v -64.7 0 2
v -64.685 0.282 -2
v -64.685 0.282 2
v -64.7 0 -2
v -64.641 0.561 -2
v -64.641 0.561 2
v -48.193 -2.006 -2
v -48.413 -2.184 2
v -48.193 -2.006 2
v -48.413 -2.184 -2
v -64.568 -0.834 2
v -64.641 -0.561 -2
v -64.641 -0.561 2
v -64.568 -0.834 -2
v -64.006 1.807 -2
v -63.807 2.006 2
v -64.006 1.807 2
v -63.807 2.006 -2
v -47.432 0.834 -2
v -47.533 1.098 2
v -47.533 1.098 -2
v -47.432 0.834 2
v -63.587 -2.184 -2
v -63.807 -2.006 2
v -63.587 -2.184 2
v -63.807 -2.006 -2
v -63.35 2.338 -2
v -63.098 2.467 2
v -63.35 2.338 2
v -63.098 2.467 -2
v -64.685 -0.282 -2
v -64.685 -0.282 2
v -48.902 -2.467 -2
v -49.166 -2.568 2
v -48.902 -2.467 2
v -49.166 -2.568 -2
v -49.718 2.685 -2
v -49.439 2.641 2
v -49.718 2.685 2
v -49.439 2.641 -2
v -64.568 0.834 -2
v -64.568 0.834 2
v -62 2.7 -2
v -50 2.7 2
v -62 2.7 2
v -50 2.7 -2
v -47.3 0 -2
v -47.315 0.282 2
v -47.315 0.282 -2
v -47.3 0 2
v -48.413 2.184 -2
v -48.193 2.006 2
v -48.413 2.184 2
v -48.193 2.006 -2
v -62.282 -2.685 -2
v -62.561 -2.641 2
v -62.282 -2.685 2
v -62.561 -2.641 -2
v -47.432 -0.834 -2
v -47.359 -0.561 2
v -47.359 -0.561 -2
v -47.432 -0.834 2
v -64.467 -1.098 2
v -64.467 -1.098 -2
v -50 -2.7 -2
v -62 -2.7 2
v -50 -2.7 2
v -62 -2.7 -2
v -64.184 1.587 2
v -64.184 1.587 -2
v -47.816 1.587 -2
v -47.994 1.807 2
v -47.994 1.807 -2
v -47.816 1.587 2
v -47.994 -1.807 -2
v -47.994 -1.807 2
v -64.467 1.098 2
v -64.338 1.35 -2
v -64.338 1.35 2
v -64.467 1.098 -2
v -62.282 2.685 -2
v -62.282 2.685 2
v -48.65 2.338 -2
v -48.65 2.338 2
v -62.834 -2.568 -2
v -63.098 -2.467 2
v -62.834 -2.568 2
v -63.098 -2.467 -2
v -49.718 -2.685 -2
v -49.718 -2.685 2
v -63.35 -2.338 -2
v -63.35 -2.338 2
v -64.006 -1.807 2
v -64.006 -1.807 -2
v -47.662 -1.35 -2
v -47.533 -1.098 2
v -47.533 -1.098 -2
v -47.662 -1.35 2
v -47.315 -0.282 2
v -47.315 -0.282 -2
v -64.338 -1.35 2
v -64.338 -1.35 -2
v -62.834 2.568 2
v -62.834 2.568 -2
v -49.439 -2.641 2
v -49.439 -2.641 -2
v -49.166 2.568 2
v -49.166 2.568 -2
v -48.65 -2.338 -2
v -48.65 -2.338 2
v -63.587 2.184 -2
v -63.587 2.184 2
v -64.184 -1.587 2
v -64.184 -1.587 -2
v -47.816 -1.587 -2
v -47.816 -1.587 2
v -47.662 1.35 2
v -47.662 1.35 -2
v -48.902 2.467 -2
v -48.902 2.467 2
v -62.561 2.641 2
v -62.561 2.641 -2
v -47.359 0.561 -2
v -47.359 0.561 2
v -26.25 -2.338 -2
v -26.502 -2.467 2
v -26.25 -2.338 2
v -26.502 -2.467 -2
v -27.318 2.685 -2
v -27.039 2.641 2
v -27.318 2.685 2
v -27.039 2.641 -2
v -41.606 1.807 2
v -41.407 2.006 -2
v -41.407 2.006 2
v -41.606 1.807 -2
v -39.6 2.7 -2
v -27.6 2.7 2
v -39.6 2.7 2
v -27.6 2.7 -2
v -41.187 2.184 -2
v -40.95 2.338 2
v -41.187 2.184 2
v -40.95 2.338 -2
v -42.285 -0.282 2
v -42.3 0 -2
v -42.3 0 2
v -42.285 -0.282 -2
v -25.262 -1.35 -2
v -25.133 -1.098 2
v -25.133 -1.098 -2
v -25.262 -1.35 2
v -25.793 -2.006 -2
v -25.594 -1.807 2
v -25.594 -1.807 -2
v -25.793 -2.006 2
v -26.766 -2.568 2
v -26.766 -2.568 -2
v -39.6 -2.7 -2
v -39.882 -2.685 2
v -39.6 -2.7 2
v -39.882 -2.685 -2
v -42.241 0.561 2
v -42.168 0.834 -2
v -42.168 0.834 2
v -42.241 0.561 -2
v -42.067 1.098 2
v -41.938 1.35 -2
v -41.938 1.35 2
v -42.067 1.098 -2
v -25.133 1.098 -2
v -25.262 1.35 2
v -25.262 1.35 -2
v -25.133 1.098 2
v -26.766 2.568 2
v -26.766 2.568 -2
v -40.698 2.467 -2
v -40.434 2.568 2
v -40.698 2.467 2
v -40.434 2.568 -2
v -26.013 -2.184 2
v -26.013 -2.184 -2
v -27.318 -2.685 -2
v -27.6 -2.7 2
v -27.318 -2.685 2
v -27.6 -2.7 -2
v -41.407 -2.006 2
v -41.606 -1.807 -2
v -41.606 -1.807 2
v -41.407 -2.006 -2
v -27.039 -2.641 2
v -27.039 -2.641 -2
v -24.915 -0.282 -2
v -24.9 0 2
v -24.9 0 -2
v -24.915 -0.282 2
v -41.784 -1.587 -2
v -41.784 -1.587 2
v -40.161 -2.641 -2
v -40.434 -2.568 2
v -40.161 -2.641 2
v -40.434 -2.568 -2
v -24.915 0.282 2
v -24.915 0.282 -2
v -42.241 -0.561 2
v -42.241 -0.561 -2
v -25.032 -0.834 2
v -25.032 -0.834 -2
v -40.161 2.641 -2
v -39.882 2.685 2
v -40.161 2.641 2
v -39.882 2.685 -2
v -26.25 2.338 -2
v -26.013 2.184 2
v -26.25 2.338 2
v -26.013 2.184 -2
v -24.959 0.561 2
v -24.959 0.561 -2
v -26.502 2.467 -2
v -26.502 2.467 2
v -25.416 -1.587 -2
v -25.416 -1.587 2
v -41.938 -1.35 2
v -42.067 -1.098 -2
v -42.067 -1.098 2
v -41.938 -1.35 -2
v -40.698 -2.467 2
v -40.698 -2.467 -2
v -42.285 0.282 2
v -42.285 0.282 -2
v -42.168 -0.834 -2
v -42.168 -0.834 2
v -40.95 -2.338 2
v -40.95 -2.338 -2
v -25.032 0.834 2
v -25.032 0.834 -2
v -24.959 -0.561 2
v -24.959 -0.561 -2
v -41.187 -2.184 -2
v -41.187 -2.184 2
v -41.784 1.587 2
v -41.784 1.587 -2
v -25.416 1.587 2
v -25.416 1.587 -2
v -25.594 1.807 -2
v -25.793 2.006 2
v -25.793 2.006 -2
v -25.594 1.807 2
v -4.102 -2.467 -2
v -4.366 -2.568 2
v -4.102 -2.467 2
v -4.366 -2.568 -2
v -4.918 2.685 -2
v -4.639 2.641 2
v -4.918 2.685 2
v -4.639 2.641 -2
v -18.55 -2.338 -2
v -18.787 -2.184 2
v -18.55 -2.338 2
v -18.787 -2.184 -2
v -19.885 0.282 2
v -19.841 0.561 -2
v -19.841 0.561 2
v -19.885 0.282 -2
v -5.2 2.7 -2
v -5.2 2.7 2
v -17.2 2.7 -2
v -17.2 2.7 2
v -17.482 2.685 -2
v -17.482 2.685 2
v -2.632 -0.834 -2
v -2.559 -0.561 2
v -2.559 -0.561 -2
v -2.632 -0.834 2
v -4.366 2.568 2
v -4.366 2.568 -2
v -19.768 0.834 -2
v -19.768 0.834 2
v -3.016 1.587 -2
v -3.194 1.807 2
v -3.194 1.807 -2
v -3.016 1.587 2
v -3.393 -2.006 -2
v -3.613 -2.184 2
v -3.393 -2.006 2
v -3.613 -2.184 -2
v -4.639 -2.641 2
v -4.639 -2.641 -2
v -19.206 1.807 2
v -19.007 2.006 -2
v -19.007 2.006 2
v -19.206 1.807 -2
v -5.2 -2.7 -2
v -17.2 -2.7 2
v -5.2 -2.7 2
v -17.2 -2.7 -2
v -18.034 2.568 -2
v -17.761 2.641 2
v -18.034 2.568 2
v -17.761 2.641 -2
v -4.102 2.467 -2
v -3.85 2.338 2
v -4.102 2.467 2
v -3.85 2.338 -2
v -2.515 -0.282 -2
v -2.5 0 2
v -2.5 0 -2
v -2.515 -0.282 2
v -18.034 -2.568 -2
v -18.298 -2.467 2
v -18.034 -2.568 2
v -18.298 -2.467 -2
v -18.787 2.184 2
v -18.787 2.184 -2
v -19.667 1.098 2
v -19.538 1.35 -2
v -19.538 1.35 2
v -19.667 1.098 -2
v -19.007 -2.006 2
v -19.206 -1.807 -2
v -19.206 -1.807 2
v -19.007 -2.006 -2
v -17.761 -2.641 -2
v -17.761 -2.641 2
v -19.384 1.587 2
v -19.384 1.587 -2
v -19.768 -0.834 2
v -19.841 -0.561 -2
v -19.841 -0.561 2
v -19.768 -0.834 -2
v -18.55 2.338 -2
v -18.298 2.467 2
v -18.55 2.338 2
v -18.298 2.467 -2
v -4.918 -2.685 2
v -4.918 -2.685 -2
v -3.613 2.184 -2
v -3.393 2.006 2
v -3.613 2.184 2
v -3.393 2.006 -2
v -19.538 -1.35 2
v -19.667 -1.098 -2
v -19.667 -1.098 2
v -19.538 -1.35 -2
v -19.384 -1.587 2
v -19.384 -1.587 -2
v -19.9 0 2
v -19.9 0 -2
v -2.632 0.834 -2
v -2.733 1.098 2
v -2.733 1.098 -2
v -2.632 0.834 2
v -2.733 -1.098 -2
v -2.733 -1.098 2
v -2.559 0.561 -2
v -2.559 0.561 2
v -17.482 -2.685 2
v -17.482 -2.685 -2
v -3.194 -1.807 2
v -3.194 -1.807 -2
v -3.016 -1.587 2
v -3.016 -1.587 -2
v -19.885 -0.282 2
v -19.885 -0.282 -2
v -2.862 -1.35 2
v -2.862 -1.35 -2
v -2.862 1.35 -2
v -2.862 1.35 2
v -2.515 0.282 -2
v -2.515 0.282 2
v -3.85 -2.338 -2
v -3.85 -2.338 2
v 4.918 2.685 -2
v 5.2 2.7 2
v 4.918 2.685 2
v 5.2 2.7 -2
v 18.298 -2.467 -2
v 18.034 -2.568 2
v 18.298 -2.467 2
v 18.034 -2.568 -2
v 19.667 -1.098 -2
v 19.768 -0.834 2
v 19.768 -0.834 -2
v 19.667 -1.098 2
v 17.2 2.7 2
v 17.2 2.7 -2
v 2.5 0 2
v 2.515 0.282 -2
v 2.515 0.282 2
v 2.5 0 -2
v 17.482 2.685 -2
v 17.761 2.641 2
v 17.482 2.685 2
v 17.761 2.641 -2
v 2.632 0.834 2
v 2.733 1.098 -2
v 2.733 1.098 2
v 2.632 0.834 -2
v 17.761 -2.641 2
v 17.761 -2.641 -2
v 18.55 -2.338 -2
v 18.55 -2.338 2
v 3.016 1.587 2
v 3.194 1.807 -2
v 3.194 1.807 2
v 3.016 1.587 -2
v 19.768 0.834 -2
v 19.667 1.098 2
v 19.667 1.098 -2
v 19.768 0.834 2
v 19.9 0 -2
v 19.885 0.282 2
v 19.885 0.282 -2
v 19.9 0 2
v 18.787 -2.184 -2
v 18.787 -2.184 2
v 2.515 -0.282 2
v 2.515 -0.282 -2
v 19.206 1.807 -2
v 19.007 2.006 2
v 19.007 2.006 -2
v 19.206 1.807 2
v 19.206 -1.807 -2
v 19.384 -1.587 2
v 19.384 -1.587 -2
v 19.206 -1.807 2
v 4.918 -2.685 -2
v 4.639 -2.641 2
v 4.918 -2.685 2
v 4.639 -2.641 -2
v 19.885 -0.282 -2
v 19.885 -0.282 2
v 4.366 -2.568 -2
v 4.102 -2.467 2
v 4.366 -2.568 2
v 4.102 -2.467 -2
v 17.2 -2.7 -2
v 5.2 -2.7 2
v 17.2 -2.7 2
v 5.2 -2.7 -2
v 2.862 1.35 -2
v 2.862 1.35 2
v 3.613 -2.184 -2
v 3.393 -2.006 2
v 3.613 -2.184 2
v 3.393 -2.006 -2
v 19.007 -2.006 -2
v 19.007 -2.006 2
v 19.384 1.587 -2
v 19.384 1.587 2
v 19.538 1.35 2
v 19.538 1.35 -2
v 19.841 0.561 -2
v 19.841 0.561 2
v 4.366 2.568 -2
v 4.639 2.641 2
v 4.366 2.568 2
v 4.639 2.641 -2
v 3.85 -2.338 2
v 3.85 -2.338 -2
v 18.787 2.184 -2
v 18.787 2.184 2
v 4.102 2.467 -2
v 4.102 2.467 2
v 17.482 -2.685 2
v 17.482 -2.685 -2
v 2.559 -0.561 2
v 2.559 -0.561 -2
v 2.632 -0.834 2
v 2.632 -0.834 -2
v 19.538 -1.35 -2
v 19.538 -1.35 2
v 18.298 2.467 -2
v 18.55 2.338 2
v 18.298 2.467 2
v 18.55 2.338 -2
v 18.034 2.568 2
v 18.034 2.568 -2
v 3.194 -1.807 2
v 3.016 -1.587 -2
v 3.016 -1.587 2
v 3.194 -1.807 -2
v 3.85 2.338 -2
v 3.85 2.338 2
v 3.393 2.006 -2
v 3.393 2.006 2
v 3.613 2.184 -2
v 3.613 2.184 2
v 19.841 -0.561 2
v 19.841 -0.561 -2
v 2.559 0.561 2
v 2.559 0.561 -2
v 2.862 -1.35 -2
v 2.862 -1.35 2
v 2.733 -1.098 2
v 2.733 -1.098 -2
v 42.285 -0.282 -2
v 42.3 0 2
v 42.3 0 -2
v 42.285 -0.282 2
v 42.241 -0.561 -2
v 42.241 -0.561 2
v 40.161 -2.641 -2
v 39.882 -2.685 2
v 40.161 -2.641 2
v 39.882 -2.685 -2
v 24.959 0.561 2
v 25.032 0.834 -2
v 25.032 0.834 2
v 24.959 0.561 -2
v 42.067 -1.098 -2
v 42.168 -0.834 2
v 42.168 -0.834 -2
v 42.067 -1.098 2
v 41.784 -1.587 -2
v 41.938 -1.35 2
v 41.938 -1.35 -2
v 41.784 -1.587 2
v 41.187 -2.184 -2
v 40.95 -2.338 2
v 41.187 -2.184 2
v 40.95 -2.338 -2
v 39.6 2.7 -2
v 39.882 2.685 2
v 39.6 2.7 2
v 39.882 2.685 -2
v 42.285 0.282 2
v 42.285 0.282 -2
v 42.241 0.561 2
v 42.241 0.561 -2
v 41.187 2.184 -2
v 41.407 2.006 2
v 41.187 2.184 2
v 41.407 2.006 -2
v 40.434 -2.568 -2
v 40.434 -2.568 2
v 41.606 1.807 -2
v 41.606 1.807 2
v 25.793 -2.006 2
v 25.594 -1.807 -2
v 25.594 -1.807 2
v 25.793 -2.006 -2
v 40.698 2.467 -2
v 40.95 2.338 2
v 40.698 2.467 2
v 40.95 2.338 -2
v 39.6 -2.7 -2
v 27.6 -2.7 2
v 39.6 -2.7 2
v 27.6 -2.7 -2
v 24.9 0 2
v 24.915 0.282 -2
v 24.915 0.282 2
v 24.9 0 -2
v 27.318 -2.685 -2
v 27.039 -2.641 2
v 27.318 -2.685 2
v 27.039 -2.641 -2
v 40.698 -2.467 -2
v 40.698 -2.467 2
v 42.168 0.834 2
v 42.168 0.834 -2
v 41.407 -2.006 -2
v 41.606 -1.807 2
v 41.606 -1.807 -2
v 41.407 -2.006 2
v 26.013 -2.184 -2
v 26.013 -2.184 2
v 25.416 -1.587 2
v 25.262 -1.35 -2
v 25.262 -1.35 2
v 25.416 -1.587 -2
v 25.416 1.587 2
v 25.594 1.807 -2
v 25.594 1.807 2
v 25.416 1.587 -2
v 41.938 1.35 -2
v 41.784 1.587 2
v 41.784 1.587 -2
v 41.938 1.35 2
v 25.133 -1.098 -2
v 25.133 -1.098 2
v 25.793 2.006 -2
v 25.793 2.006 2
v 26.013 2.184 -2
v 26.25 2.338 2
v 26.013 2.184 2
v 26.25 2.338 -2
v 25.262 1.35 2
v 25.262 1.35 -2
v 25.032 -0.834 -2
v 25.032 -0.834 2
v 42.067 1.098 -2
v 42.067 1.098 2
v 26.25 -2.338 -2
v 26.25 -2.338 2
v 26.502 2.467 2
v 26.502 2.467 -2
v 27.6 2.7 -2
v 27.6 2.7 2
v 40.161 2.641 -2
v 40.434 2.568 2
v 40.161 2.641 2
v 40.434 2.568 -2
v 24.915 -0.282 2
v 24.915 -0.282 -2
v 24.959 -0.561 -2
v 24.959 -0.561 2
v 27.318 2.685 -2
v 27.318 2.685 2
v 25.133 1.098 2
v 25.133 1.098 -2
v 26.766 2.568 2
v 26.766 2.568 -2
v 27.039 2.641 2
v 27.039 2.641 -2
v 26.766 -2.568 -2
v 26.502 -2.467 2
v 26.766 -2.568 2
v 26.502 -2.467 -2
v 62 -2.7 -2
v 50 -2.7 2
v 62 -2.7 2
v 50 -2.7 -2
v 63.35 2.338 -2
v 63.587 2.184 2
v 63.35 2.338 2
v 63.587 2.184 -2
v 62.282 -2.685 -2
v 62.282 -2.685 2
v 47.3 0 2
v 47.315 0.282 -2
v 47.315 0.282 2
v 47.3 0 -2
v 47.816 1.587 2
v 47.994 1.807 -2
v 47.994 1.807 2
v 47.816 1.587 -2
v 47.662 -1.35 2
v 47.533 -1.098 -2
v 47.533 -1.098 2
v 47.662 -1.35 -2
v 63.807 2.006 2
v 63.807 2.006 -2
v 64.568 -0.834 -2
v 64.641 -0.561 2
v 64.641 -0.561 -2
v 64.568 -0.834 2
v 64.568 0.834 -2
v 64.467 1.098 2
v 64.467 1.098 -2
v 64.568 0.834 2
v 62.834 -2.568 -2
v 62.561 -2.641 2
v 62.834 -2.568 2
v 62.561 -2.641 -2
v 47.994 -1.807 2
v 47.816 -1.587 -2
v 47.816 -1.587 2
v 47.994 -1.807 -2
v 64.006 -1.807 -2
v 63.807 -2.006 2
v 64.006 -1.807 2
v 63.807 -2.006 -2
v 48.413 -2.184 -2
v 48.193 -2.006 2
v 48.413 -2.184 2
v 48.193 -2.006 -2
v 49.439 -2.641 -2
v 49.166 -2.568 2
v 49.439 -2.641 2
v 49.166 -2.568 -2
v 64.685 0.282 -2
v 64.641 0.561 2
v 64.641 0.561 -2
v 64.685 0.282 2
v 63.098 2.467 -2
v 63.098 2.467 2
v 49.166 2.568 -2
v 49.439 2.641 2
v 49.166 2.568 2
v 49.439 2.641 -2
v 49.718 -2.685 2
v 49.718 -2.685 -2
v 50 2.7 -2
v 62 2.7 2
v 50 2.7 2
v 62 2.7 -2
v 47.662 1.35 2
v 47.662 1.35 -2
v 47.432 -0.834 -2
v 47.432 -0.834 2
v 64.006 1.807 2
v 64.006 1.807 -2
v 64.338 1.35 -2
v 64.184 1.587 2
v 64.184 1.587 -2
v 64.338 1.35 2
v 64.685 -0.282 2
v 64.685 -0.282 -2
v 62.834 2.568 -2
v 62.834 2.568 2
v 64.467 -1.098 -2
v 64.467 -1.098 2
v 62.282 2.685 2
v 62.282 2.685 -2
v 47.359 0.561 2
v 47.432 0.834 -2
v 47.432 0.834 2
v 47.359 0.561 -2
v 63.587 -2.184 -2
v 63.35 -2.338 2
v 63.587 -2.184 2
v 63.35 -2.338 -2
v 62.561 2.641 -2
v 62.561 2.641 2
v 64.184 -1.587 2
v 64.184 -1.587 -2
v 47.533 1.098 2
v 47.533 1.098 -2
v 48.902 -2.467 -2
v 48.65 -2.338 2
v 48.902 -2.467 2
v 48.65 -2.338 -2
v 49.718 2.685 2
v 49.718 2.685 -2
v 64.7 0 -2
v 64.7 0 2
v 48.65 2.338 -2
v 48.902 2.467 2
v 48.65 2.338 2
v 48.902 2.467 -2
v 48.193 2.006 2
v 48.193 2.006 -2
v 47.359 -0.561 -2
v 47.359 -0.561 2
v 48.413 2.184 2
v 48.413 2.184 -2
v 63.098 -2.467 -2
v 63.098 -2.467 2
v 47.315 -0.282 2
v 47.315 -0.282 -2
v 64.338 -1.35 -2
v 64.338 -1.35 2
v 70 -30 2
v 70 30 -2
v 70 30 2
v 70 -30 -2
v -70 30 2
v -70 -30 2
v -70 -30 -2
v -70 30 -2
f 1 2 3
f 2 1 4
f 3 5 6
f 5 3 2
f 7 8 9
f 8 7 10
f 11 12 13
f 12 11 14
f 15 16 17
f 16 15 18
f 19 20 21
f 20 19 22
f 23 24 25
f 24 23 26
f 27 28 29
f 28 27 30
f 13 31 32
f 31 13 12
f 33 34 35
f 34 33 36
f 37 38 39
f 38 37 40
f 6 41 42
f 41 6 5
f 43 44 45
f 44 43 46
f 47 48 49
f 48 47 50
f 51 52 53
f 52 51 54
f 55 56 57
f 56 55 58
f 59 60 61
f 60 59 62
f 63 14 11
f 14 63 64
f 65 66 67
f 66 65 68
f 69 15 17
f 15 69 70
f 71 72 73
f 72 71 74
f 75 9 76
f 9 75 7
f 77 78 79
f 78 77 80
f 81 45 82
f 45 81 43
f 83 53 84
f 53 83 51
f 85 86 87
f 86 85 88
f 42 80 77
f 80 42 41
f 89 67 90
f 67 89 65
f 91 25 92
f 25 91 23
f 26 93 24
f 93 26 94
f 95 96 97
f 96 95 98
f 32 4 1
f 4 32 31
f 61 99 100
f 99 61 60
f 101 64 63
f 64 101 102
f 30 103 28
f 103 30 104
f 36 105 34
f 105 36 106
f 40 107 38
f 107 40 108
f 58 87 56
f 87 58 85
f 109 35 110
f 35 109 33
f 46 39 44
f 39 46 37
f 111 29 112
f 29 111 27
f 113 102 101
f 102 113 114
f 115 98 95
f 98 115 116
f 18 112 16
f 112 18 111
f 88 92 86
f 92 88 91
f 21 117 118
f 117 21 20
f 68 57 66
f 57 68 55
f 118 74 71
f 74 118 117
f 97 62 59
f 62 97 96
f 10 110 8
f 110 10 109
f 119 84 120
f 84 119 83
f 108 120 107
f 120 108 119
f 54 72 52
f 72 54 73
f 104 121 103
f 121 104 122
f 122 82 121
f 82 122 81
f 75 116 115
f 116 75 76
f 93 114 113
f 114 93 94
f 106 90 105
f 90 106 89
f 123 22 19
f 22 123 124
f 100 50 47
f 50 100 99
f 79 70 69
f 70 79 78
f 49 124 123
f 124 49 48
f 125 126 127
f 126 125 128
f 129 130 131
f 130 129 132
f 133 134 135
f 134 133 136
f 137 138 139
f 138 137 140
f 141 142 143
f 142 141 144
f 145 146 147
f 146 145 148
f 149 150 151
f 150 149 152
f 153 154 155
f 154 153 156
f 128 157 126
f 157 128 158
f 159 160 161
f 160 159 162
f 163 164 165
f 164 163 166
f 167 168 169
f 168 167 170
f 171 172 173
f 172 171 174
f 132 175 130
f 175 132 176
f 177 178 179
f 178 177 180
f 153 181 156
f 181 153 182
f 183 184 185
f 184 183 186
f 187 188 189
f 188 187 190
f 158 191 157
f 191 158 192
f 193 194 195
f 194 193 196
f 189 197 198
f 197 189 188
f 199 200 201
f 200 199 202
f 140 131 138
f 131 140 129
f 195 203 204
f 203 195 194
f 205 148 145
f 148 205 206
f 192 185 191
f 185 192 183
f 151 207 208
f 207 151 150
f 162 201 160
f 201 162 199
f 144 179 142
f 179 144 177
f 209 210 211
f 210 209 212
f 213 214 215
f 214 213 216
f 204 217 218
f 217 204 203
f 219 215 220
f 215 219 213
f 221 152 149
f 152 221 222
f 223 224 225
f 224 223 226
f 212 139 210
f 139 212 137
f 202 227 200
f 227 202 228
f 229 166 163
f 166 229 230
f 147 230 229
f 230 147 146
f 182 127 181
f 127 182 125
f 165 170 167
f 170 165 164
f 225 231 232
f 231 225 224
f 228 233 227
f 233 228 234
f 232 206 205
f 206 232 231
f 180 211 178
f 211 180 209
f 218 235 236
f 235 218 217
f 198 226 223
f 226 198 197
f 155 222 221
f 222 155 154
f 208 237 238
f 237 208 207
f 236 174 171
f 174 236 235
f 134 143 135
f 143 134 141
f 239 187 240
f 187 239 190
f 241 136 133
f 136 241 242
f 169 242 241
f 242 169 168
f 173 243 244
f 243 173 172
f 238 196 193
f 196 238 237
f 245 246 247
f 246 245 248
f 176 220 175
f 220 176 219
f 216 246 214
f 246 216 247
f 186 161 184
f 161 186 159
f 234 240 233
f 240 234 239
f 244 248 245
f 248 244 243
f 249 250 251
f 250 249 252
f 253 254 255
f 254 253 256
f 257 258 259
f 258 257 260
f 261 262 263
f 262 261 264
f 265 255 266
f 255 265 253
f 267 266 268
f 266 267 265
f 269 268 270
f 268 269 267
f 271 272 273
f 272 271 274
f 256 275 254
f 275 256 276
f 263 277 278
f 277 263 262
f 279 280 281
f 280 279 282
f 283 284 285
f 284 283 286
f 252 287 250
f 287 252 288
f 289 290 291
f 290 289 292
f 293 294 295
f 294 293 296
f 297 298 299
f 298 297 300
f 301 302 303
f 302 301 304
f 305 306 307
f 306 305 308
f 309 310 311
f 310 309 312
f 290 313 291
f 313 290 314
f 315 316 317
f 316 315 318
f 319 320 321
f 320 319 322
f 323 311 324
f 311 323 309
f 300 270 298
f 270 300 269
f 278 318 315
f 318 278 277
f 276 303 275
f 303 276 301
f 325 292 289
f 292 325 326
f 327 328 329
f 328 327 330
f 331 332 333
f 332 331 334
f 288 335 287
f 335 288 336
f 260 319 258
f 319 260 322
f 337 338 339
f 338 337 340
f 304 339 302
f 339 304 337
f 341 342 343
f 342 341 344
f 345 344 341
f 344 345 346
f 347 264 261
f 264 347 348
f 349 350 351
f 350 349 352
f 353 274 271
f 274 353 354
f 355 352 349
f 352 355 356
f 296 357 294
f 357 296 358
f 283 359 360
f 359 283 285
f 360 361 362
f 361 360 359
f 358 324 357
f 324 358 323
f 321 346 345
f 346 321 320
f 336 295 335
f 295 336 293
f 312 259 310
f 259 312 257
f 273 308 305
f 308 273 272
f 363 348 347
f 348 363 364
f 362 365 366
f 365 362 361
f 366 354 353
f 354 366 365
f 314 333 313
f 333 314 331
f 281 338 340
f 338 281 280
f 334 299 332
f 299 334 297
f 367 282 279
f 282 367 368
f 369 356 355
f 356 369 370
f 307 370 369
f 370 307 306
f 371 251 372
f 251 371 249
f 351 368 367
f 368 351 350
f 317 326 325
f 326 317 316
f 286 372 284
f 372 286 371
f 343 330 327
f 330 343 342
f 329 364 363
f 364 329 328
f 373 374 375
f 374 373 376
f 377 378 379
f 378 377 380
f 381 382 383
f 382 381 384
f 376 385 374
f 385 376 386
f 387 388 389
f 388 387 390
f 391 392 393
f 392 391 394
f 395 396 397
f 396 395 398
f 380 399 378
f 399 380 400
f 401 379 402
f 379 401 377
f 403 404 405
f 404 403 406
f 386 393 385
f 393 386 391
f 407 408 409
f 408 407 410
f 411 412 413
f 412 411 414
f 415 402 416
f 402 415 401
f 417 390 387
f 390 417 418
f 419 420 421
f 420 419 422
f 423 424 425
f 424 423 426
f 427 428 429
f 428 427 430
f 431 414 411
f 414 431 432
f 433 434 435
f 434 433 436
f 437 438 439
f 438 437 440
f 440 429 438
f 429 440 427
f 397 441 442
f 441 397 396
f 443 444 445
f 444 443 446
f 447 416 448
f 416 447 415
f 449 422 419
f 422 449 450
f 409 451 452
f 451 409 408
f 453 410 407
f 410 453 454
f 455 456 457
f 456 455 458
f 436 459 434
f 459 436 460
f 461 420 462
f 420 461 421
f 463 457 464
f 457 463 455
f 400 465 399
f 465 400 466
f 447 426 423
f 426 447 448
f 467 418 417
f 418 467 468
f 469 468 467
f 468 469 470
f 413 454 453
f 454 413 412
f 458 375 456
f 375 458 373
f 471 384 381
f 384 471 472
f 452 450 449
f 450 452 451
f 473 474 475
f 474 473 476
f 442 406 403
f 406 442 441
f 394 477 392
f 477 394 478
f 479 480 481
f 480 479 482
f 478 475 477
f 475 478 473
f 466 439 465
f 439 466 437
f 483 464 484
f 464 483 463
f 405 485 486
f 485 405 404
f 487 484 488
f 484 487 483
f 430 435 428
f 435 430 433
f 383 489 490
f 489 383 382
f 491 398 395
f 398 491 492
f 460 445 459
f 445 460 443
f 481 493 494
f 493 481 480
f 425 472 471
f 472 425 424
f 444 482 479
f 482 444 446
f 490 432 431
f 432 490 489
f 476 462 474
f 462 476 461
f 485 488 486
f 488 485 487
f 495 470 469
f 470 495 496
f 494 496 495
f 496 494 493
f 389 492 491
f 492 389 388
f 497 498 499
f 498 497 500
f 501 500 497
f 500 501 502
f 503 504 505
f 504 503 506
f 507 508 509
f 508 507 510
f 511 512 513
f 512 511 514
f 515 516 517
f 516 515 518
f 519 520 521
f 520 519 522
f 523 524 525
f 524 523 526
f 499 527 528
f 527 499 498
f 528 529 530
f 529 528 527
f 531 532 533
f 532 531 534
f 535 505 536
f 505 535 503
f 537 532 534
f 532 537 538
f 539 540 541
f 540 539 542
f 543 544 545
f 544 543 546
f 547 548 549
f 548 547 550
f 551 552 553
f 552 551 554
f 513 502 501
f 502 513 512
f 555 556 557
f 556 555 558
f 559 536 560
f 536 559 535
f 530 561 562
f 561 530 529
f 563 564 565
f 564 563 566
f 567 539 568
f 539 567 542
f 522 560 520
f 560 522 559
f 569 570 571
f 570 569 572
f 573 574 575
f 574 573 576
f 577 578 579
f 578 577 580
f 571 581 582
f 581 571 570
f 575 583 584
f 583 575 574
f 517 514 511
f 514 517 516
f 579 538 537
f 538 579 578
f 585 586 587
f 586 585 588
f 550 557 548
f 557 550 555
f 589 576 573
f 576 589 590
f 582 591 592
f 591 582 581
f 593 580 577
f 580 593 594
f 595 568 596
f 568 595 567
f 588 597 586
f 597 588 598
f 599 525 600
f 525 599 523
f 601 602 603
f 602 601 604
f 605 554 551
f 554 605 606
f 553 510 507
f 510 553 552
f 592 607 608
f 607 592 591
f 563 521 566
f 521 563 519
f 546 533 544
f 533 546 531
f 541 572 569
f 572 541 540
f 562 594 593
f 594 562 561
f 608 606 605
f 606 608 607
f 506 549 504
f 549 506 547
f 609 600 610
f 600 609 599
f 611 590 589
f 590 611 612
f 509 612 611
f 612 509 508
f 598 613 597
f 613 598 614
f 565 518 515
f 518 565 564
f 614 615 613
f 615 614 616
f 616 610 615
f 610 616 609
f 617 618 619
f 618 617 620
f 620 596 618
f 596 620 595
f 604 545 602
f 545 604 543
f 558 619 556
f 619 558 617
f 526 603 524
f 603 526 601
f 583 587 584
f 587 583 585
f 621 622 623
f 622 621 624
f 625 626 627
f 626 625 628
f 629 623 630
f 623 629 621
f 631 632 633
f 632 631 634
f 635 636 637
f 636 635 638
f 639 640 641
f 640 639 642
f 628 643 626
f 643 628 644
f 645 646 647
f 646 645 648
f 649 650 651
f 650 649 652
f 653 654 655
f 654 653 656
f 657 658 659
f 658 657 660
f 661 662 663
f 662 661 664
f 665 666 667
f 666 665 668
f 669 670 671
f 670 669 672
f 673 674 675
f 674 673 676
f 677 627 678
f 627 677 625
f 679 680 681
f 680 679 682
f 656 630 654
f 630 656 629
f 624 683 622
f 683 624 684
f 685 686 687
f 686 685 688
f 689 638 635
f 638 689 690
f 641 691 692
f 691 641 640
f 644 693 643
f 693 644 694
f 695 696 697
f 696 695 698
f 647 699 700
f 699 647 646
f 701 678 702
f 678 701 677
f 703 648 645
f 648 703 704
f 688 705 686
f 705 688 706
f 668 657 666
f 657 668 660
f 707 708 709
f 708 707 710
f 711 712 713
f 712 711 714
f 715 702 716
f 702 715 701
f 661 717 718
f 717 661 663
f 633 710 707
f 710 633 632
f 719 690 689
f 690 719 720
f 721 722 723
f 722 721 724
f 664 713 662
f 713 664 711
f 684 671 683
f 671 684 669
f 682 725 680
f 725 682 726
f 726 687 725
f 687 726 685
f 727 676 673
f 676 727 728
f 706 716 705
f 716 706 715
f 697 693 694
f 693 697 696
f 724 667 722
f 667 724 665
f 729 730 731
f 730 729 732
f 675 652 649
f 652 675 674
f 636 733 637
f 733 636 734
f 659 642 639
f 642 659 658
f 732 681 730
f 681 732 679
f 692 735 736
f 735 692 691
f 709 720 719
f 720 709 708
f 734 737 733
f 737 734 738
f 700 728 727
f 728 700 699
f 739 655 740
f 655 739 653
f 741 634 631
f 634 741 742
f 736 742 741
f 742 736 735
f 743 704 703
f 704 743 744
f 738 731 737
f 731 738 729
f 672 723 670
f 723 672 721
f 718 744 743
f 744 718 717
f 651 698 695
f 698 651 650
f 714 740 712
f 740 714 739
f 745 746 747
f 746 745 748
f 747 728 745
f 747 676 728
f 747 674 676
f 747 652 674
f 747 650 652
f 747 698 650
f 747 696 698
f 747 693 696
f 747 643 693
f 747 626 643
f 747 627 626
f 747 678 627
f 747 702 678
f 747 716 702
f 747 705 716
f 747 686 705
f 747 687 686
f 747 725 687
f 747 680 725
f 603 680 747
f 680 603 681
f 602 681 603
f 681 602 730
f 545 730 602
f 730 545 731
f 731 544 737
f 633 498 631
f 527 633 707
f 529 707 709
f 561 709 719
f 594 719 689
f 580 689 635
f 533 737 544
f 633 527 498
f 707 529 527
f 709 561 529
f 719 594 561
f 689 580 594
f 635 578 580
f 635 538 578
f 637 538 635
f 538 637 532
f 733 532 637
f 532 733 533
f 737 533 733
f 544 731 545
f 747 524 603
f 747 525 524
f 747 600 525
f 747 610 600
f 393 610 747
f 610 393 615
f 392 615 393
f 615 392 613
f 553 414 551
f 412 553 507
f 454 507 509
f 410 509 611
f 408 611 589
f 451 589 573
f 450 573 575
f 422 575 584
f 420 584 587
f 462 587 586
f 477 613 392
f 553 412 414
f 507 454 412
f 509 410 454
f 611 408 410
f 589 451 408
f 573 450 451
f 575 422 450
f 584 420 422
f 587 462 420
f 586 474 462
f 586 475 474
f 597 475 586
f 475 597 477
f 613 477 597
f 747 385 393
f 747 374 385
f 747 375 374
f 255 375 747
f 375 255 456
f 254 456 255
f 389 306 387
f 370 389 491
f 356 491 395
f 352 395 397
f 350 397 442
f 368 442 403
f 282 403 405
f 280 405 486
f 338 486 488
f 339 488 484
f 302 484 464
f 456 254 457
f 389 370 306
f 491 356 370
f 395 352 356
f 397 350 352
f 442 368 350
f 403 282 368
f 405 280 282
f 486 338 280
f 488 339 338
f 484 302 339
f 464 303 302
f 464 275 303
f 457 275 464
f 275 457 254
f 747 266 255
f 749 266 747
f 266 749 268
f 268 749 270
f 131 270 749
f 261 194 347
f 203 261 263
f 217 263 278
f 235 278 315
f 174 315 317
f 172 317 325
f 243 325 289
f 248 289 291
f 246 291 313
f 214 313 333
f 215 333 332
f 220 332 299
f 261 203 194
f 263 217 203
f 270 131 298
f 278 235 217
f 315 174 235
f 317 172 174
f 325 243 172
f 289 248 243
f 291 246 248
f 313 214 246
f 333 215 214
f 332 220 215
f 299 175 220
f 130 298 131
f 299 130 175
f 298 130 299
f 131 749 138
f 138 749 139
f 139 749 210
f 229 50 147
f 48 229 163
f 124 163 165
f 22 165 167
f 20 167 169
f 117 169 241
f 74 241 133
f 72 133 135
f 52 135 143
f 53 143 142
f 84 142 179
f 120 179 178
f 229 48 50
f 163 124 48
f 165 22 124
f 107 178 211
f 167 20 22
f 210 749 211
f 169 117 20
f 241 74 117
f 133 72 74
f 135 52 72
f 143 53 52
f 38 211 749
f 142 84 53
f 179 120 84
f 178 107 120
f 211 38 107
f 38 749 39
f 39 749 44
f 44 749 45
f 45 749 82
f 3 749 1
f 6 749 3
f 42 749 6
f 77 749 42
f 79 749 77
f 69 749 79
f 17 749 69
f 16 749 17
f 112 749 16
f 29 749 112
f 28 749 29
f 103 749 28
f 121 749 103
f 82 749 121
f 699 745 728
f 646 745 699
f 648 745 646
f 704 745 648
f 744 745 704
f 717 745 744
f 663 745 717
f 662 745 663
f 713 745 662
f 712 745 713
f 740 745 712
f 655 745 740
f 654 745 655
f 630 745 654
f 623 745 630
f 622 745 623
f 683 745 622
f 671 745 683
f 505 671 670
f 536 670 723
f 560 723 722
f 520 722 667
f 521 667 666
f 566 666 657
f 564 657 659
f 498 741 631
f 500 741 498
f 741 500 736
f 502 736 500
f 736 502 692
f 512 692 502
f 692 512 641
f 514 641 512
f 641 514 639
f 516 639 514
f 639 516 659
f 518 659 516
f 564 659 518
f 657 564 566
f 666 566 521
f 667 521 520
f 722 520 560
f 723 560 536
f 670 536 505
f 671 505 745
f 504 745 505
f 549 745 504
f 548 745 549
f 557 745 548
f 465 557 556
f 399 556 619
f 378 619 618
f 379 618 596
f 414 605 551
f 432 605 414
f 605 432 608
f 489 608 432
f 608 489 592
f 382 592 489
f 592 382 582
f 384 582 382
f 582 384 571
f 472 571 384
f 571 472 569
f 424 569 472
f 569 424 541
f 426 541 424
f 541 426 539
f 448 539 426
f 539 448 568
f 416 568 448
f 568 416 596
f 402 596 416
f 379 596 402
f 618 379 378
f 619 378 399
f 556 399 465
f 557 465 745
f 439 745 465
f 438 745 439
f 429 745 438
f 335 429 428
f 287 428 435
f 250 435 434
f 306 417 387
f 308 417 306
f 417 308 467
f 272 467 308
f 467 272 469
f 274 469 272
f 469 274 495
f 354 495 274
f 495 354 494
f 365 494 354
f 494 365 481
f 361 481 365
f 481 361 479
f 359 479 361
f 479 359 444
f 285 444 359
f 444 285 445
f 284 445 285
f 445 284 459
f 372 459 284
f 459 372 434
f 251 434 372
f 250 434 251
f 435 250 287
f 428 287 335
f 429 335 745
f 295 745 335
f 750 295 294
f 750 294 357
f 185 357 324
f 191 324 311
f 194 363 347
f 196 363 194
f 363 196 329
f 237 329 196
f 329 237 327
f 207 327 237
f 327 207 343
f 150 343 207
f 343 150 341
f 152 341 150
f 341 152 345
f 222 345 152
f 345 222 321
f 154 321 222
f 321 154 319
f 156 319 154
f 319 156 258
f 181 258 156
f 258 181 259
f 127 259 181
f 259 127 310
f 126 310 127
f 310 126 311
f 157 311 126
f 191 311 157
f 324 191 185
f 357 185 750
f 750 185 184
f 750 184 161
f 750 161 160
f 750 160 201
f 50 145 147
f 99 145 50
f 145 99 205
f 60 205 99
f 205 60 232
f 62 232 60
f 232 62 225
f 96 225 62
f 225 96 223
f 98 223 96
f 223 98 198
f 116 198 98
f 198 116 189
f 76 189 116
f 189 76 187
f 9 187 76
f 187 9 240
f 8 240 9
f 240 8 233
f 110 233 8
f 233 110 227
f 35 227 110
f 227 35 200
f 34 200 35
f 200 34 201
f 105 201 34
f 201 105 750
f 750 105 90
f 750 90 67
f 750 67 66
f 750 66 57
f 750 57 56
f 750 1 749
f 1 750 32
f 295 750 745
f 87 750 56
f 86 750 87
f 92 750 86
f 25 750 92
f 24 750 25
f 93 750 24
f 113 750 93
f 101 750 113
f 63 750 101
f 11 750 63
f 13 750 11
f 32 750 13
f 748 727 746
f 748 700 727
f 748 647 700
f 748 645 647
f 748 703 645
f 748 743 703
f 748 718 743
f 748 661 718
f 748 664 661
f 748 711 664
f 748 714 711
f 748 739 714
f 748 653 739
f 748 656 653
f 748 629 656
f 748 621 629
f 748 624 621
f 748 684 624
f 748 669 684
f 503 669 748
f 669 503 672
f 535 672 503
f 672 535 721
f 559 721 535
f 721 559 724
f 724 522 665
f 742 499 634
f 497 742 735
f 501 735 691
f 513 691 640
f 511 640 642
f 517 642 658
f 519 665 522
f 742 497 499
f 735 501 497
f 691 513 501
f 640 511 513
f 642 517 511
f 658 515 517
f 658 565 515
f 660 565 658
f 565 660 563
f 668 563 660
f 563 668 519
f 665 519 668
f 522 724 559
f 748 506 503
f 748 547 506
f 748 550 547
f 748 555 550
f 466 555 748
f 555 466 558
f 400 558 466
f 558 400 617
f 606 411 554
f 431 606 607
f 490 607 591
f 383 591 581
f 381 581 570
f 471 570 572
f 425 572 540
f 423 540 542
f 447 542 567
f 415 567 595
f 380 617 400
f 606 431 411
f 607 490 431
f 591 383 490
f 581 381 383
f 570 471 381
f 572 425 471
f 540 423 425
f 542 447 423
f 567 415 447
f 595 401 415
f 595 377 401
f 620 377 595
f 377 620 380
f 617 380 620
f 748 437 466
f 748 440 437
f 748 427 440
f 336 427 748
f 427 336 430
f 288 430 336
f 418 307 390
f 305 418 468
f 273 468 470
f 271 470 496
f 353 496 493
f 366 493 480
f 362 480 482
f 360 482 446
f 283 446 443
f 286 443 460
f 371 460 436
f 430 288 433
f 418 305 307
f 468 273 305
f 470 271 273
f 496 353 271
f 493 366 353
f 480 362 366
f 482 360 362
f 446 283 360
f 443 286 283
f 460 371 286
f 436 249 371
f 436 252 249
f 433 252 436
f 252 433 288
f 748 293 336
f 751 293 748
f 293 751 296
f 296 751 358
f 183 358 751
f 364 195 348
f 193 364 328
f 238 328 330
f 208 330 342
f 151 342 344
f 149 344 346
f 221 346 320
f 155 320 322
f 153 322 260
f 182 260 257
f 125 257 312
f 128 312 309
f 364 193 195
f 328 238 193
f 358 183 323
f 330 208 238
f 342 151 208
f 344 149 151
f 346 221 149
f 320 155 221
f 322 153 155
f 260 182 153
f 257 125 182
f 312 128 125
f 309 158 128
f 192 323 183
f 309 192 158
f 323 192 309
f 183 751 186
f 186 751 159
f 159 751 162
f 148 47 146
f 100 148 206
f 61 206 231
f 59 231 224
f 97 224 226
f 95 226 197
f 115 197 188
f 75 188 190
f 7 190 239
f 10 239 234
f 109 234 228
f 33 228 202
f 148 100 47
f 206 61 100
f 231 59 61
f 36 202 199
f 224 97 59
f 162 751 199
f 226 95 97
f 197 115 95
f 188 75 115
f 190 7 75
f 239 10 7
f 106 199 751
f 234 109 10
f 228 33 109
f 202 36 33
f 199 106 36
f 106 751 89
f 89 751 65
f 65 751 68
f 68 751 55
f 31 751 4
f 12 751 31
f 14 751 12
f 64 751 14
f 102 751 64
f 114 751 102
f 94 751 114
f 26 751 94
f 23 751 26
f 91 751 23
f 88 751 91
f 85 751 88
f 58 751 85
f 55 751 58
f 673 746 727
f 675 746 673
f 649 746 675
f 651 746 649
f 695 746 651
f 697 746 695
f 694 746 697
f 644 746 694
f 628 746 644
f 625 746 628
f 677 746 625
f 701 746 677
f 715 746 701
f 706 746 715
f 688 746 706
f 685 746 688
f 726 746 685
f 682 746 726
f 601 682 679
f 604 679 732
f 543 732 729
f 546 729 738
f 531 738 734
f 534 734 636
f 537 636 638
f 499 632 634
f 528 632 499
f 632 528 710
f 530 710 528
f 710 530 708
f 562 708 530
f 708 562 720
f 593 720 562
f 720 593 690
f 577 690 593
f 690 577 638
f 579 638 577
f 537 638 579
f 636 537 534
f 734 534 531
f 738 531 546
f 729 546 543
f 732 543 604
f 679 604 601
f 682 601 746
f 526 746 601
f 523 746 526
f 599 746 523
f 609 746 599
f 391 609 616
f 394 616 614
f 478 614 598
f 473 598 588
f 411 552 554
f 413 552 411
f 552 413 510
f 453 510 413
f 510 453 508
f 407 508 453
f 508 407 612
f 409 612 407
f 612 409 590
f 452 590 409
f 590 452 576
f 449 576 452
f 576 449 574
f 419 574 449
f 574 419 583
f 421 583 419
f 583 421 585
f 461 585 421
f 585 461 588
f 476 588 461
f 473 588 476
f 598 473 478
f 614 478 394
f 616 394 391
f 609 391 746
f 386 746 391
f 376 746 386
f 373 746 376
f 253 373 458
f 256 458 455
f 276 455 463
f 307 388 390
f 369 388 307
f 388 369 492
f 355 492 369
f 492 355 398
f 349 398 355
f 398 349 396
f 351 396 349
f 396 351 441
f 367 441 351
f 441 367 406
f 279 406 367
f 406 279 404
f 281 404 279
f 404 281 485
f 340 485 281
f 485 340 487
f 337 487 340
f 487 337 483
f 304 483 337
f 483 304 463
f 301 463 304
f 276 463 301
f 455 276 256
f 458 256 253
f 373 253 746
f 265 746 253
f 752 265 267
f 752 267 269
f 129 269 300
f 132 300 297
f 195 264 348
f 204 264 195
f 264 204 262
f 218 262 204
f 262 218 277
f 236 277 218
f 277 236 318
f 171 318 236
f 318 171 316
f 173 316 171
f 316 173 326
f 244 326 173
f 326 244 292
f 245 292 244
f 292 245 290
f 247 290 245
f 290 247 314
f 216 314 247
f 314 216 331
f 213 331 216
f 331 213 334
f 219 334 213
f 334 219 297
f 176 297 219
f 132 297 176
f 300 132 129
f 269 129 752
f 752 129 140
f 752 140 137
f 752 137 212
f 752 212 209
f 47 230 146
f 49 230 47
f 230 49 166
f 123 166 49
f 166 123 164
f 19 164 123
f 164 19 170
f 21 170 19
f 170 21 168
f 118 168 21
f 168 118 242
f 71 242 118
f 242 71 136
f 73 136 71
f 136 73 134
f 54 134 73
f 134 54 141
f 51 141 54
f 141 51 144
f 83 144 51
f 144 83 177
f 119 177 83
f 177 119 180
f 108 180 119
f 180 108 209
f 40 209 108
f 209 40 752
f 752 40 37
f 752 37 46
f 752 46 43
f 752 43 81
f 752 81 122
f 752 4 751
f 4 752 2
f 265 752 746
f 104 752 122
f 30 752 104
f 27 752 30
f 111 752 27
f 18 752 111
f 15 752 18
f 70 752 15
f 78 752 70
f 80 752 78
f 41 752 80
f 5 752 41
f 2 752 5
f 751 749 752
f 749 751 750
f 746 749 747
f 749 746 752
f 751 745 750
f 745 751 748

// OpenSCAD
// Slotted mounting plate.
$fn = 60;
eps = 0.02;
plate_l = 140;
plate_w = 60;
plate_t = 4;
slot_l = 12;
module slot(x) { hull() { translate([x-slot_l/2,0,-plate_t/2-eps]) cylinder(d=5.4,h=plate_t+2*eps); translate([x+slot_l/2,0,-plate_t/2-eps]) cylinder(d=5.4,h=plate_t+2*eps); } }
difference() { cube([plate_l,plate_w,plate_t],center=true); for(i=[0:5]) slot(-plate_l/2+14+i*(plate_l-28)/max(1,5)); }
